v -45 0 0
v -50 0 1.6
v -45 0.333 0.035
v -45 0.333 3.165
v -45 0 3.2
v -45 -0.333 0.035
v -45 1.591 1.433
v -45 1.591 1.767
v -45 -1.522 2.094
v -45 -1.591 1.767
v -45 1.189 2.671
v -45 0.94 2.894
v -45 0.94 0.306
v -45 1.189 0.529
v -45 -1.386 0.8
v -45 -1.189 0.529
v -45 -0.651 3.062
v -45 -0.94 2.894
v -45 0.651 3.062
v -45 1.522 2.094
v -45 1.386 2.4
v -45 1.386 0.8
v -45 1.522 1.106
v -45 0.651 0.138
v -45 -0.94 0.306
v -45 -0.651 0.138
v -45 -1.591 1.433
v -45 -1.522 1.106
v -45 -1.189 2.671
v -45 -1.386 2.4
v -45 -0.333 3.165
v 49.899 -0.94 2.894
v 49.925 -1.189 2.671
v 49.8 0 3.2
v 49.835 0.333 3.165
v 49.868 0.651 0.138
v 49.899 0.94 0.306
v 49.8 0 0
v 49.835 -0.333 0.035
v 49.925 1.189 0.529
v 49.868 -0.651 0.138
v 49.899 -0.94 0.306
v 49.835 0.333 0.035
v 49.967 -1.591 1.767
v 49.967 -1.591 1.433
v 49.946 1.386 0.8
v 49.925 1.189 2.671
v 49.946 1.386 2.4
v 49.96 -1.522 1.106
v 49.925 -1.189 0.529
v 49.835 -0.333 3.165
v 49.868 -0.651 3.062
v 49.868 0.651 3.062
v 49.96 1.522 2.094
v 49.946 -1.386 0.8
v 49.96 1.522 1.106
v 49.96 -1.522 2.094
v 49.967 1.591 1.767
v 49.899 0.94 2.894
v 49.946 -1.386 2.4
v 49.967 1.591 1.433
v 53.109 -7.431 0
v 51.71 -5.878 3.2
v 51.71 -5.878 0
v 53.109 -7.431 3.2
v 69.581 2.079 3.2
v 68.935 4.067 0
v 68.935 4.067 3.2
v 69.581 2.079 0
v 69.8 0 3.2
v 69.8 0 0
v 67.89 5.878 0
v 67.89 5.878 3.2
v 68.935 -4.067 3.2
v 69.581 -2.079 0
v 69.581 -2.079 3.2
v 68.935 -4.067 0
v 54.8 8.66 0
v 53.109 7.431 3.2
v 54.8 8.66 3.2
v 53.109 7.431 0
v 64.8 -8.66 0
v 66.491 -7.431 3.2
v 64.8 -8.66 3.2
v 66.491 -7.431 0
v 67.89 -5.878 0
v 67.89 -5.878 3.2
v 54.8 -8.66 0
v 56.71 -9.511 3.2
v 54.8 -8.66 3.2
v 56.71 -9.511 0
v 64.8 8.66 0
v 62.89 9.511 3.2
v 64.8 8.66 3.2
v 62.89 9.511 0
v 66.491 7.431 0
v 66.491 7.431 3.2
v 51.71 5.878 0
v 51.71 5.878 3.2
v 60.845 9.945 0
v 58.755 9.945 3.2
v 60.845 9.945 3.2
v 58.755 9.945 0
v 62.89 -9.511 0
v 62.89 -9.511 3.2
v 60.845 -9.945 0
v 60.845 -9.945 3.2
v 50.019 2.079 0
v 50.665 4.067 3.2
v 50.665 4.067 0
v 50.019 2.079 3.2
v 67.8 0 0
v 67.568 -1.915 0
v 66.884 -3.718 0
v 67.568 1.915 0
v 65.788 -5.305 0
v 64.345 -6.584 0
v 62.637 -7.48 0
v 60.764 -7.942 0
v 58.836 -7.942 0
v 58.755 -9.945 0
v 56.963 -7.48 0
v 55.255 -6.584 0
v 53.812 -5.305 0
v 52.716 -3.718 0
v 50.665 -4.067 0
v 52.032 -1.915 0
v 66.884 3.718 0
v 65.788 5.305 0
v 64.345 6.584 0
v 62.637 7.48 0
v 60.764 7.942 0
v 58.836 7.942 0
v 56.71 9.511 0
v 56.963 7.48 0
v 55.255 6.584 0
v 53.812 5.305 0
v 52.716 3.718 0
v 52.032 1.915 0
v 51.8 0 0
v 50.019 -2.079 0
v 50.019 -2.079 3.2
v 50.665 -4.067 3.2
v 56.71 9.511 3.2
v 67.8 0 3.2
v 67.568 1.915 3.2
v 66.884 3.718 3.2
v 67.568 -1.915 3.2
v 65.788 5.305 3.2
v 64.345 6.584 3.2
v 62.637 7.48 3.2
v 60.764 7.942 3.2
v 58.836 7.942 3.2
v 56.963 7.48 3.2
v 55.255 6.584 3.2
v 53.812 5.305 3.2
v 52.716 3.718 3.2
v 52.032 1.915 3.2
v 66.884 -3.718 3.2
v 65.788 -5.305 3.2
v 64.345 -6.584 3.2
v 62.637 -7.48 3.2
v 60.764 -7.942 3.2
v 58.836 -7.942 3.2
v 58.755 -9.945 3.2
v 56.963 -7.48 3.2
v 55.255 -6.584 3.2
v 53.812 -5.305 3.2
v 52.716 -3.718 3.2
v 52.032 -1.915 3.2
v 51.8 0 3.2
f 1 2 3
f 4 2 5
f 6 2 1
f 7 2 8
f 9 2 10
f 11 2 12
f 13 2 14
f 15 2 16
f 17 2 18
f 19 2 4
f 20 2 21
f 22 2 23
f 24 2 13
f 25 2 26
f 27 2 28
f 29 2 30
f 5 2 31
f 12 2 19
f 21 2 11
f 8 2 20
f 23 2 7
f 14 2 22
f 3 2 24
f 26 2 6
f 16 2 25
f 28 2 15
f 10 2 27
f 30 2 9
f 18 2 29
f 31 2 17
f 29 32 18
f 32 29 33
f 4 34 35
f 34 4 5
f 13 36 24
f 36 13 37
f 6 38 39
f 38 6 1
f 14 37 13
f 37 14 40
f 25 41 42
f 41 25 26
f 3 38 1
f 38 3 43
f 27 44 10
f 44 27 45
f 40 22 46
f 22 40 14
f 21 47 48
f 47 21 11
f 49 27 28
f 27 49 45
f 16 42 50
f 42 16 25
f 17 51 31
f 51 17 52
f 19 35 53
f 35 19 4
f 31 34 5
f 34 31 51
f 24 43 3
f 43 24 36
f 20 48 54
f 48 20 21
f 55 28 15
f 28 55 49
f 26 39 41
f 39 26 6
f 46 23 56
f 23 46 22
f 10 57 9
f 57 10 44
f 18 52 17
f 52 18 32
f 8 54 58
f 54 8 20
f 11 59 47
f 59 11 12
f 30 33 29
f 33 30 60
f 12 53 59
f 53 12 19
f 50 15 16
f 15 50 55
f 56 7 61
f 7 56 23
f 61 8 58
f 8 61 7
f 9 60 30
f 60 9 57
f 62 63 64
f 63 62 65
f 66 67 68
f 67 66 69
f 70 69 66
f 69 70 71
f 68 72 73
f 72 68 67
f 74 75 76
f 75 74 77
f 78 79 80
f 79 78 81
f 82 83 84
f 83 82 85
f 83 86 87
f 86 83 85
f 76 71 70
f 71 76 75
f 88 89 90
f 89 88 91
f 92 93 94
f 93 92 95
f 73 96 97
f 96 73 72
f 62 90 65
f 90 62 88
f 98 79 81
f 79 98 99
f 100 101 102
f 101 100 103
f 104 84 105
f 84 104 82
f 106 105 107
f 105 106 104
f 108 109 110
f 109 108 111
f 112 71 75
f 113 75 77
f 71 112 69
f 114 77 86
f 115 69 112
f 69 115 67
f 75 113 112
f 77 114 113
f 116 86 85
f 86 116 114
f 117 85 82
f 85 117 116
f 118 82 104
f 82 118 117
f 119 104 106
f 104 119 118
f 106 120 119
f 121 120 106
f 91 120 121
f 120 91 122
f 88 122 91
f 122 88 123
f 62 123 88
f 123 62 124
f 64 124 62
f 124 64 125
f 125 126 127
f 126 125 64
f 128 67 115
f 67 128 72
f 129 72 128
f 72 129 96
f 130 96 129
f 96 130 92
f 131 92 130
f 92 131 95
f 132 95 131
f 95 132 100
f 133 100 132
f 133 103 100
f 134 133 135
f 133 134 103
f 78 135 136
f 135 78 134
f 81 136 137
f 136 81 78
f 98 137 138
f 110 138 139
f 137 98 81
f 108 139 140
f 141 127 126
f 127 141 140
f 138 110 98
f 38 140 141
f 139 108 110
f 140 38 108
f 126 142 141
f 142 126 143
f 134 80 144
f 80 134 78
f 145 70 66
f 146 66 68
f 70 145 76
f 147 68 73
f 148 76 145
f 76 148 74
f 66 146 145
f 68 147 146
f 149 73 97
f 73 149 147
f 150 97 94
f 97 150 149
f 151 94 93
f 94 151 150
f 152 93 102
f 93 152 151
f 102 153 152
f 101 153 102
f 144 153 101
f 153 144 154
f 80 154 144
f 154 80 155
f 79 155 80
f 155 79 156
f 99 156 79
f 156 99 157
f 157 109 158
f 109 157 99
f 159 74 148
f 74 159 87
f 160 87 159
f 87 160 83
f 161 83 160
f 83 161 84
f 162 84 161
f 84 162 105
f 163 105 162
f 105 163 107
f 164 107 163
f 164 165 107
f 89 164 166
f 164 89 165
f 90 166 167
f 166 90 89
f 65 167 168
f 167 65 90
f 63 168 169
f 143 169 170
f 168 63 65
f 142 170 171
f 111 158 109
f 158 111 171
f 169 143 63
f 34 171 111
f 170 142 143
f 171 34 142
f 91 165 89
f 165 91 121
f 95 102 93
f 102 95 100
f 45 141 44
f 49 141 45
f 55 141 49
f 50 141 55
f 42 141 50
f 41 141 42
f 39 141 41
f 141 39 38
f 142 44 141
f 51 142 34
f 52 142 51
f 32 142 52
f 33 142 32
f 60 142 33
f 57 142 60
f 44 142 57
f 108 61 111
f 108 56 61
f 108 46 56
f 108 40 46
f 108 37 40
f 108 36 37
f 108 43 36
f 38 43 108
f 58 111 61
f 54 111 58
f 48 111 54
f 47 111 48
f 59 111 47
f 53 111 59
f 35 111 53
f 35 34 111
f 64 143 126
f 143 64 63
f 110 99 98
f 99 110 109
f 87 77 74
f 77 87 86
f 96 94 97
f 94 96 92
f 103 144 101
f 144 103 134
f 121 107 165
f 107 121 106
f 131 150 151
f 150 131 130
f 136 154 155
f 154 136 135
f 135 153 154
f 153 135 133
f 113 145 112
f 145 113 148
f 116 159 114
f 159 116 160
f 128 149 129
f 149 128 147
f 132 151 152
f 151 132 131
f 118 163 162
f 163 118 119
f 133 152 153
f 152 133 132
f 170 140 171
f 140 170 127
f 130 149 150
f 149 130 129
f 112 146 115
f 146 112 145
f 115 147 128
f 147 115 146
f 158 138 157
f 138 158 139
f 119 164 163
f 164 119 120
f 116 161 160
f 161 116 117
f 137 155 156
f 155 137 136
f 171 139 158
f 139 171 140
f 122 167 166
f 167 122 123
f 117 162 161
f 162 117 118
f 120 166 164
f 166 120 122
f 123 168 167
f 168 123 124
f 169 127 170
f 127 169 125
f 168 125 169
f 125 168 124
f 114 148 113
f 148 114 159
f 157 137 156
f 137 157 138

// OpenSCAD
//
// Straight cocktail stick with round, pointed stick
//
// The "ornament" is just a ring 
//
// by Egil Kvaleberg
//

//*****************************************************************************
// Adjustables

// length of stick
total_length = 100;

// length of cone section
cone_length = 5; 

// diameter of stick
stick_diameter = 3.2;

// size of ornament
ornament_size = 20;

// thickness of ornament
ornament_thickness = 2;

stick_fs = 1*0.1;
ornament_fs = 1*0.5;

//*****************************************************************************
// Derived

stick_radius = stick_diameter / 2;
stick_length = total_length - cone_length;

//*****************************************************************************
// View and printing

view(); 

//*****************************************************************************
// 

module cone()
{
    rotate([0, 90, 0]) cylinder(r1 = 0, r2 = stick_radius, h = cone_length, $fs = stick_fs);
}

module stick()
{
    translate([cone_length, 0, 0]) rotate([0, 90, 0]) cylinder(r = stick_radius, h = stick_length, $fs =stick_fs);
}

module ornament()
{
    difference() {
        cylinder(r = ornament_size/2, h = stick_diameter);
        translate([0, 0, -stick_diameter/2]) cylinder(r = ornament_size/2 - ornament_thickness, h = stick_diameter*2);
    }
}

module view()
{
     translate([-total_length/2, 0, stick_radius]) {
         cone();
         stick();
    }
    translate([total_length/2 + ornament_size/2 - 0.2, 0, 0]) {     
        ornament();
    }
}

//*****************************************************************************
